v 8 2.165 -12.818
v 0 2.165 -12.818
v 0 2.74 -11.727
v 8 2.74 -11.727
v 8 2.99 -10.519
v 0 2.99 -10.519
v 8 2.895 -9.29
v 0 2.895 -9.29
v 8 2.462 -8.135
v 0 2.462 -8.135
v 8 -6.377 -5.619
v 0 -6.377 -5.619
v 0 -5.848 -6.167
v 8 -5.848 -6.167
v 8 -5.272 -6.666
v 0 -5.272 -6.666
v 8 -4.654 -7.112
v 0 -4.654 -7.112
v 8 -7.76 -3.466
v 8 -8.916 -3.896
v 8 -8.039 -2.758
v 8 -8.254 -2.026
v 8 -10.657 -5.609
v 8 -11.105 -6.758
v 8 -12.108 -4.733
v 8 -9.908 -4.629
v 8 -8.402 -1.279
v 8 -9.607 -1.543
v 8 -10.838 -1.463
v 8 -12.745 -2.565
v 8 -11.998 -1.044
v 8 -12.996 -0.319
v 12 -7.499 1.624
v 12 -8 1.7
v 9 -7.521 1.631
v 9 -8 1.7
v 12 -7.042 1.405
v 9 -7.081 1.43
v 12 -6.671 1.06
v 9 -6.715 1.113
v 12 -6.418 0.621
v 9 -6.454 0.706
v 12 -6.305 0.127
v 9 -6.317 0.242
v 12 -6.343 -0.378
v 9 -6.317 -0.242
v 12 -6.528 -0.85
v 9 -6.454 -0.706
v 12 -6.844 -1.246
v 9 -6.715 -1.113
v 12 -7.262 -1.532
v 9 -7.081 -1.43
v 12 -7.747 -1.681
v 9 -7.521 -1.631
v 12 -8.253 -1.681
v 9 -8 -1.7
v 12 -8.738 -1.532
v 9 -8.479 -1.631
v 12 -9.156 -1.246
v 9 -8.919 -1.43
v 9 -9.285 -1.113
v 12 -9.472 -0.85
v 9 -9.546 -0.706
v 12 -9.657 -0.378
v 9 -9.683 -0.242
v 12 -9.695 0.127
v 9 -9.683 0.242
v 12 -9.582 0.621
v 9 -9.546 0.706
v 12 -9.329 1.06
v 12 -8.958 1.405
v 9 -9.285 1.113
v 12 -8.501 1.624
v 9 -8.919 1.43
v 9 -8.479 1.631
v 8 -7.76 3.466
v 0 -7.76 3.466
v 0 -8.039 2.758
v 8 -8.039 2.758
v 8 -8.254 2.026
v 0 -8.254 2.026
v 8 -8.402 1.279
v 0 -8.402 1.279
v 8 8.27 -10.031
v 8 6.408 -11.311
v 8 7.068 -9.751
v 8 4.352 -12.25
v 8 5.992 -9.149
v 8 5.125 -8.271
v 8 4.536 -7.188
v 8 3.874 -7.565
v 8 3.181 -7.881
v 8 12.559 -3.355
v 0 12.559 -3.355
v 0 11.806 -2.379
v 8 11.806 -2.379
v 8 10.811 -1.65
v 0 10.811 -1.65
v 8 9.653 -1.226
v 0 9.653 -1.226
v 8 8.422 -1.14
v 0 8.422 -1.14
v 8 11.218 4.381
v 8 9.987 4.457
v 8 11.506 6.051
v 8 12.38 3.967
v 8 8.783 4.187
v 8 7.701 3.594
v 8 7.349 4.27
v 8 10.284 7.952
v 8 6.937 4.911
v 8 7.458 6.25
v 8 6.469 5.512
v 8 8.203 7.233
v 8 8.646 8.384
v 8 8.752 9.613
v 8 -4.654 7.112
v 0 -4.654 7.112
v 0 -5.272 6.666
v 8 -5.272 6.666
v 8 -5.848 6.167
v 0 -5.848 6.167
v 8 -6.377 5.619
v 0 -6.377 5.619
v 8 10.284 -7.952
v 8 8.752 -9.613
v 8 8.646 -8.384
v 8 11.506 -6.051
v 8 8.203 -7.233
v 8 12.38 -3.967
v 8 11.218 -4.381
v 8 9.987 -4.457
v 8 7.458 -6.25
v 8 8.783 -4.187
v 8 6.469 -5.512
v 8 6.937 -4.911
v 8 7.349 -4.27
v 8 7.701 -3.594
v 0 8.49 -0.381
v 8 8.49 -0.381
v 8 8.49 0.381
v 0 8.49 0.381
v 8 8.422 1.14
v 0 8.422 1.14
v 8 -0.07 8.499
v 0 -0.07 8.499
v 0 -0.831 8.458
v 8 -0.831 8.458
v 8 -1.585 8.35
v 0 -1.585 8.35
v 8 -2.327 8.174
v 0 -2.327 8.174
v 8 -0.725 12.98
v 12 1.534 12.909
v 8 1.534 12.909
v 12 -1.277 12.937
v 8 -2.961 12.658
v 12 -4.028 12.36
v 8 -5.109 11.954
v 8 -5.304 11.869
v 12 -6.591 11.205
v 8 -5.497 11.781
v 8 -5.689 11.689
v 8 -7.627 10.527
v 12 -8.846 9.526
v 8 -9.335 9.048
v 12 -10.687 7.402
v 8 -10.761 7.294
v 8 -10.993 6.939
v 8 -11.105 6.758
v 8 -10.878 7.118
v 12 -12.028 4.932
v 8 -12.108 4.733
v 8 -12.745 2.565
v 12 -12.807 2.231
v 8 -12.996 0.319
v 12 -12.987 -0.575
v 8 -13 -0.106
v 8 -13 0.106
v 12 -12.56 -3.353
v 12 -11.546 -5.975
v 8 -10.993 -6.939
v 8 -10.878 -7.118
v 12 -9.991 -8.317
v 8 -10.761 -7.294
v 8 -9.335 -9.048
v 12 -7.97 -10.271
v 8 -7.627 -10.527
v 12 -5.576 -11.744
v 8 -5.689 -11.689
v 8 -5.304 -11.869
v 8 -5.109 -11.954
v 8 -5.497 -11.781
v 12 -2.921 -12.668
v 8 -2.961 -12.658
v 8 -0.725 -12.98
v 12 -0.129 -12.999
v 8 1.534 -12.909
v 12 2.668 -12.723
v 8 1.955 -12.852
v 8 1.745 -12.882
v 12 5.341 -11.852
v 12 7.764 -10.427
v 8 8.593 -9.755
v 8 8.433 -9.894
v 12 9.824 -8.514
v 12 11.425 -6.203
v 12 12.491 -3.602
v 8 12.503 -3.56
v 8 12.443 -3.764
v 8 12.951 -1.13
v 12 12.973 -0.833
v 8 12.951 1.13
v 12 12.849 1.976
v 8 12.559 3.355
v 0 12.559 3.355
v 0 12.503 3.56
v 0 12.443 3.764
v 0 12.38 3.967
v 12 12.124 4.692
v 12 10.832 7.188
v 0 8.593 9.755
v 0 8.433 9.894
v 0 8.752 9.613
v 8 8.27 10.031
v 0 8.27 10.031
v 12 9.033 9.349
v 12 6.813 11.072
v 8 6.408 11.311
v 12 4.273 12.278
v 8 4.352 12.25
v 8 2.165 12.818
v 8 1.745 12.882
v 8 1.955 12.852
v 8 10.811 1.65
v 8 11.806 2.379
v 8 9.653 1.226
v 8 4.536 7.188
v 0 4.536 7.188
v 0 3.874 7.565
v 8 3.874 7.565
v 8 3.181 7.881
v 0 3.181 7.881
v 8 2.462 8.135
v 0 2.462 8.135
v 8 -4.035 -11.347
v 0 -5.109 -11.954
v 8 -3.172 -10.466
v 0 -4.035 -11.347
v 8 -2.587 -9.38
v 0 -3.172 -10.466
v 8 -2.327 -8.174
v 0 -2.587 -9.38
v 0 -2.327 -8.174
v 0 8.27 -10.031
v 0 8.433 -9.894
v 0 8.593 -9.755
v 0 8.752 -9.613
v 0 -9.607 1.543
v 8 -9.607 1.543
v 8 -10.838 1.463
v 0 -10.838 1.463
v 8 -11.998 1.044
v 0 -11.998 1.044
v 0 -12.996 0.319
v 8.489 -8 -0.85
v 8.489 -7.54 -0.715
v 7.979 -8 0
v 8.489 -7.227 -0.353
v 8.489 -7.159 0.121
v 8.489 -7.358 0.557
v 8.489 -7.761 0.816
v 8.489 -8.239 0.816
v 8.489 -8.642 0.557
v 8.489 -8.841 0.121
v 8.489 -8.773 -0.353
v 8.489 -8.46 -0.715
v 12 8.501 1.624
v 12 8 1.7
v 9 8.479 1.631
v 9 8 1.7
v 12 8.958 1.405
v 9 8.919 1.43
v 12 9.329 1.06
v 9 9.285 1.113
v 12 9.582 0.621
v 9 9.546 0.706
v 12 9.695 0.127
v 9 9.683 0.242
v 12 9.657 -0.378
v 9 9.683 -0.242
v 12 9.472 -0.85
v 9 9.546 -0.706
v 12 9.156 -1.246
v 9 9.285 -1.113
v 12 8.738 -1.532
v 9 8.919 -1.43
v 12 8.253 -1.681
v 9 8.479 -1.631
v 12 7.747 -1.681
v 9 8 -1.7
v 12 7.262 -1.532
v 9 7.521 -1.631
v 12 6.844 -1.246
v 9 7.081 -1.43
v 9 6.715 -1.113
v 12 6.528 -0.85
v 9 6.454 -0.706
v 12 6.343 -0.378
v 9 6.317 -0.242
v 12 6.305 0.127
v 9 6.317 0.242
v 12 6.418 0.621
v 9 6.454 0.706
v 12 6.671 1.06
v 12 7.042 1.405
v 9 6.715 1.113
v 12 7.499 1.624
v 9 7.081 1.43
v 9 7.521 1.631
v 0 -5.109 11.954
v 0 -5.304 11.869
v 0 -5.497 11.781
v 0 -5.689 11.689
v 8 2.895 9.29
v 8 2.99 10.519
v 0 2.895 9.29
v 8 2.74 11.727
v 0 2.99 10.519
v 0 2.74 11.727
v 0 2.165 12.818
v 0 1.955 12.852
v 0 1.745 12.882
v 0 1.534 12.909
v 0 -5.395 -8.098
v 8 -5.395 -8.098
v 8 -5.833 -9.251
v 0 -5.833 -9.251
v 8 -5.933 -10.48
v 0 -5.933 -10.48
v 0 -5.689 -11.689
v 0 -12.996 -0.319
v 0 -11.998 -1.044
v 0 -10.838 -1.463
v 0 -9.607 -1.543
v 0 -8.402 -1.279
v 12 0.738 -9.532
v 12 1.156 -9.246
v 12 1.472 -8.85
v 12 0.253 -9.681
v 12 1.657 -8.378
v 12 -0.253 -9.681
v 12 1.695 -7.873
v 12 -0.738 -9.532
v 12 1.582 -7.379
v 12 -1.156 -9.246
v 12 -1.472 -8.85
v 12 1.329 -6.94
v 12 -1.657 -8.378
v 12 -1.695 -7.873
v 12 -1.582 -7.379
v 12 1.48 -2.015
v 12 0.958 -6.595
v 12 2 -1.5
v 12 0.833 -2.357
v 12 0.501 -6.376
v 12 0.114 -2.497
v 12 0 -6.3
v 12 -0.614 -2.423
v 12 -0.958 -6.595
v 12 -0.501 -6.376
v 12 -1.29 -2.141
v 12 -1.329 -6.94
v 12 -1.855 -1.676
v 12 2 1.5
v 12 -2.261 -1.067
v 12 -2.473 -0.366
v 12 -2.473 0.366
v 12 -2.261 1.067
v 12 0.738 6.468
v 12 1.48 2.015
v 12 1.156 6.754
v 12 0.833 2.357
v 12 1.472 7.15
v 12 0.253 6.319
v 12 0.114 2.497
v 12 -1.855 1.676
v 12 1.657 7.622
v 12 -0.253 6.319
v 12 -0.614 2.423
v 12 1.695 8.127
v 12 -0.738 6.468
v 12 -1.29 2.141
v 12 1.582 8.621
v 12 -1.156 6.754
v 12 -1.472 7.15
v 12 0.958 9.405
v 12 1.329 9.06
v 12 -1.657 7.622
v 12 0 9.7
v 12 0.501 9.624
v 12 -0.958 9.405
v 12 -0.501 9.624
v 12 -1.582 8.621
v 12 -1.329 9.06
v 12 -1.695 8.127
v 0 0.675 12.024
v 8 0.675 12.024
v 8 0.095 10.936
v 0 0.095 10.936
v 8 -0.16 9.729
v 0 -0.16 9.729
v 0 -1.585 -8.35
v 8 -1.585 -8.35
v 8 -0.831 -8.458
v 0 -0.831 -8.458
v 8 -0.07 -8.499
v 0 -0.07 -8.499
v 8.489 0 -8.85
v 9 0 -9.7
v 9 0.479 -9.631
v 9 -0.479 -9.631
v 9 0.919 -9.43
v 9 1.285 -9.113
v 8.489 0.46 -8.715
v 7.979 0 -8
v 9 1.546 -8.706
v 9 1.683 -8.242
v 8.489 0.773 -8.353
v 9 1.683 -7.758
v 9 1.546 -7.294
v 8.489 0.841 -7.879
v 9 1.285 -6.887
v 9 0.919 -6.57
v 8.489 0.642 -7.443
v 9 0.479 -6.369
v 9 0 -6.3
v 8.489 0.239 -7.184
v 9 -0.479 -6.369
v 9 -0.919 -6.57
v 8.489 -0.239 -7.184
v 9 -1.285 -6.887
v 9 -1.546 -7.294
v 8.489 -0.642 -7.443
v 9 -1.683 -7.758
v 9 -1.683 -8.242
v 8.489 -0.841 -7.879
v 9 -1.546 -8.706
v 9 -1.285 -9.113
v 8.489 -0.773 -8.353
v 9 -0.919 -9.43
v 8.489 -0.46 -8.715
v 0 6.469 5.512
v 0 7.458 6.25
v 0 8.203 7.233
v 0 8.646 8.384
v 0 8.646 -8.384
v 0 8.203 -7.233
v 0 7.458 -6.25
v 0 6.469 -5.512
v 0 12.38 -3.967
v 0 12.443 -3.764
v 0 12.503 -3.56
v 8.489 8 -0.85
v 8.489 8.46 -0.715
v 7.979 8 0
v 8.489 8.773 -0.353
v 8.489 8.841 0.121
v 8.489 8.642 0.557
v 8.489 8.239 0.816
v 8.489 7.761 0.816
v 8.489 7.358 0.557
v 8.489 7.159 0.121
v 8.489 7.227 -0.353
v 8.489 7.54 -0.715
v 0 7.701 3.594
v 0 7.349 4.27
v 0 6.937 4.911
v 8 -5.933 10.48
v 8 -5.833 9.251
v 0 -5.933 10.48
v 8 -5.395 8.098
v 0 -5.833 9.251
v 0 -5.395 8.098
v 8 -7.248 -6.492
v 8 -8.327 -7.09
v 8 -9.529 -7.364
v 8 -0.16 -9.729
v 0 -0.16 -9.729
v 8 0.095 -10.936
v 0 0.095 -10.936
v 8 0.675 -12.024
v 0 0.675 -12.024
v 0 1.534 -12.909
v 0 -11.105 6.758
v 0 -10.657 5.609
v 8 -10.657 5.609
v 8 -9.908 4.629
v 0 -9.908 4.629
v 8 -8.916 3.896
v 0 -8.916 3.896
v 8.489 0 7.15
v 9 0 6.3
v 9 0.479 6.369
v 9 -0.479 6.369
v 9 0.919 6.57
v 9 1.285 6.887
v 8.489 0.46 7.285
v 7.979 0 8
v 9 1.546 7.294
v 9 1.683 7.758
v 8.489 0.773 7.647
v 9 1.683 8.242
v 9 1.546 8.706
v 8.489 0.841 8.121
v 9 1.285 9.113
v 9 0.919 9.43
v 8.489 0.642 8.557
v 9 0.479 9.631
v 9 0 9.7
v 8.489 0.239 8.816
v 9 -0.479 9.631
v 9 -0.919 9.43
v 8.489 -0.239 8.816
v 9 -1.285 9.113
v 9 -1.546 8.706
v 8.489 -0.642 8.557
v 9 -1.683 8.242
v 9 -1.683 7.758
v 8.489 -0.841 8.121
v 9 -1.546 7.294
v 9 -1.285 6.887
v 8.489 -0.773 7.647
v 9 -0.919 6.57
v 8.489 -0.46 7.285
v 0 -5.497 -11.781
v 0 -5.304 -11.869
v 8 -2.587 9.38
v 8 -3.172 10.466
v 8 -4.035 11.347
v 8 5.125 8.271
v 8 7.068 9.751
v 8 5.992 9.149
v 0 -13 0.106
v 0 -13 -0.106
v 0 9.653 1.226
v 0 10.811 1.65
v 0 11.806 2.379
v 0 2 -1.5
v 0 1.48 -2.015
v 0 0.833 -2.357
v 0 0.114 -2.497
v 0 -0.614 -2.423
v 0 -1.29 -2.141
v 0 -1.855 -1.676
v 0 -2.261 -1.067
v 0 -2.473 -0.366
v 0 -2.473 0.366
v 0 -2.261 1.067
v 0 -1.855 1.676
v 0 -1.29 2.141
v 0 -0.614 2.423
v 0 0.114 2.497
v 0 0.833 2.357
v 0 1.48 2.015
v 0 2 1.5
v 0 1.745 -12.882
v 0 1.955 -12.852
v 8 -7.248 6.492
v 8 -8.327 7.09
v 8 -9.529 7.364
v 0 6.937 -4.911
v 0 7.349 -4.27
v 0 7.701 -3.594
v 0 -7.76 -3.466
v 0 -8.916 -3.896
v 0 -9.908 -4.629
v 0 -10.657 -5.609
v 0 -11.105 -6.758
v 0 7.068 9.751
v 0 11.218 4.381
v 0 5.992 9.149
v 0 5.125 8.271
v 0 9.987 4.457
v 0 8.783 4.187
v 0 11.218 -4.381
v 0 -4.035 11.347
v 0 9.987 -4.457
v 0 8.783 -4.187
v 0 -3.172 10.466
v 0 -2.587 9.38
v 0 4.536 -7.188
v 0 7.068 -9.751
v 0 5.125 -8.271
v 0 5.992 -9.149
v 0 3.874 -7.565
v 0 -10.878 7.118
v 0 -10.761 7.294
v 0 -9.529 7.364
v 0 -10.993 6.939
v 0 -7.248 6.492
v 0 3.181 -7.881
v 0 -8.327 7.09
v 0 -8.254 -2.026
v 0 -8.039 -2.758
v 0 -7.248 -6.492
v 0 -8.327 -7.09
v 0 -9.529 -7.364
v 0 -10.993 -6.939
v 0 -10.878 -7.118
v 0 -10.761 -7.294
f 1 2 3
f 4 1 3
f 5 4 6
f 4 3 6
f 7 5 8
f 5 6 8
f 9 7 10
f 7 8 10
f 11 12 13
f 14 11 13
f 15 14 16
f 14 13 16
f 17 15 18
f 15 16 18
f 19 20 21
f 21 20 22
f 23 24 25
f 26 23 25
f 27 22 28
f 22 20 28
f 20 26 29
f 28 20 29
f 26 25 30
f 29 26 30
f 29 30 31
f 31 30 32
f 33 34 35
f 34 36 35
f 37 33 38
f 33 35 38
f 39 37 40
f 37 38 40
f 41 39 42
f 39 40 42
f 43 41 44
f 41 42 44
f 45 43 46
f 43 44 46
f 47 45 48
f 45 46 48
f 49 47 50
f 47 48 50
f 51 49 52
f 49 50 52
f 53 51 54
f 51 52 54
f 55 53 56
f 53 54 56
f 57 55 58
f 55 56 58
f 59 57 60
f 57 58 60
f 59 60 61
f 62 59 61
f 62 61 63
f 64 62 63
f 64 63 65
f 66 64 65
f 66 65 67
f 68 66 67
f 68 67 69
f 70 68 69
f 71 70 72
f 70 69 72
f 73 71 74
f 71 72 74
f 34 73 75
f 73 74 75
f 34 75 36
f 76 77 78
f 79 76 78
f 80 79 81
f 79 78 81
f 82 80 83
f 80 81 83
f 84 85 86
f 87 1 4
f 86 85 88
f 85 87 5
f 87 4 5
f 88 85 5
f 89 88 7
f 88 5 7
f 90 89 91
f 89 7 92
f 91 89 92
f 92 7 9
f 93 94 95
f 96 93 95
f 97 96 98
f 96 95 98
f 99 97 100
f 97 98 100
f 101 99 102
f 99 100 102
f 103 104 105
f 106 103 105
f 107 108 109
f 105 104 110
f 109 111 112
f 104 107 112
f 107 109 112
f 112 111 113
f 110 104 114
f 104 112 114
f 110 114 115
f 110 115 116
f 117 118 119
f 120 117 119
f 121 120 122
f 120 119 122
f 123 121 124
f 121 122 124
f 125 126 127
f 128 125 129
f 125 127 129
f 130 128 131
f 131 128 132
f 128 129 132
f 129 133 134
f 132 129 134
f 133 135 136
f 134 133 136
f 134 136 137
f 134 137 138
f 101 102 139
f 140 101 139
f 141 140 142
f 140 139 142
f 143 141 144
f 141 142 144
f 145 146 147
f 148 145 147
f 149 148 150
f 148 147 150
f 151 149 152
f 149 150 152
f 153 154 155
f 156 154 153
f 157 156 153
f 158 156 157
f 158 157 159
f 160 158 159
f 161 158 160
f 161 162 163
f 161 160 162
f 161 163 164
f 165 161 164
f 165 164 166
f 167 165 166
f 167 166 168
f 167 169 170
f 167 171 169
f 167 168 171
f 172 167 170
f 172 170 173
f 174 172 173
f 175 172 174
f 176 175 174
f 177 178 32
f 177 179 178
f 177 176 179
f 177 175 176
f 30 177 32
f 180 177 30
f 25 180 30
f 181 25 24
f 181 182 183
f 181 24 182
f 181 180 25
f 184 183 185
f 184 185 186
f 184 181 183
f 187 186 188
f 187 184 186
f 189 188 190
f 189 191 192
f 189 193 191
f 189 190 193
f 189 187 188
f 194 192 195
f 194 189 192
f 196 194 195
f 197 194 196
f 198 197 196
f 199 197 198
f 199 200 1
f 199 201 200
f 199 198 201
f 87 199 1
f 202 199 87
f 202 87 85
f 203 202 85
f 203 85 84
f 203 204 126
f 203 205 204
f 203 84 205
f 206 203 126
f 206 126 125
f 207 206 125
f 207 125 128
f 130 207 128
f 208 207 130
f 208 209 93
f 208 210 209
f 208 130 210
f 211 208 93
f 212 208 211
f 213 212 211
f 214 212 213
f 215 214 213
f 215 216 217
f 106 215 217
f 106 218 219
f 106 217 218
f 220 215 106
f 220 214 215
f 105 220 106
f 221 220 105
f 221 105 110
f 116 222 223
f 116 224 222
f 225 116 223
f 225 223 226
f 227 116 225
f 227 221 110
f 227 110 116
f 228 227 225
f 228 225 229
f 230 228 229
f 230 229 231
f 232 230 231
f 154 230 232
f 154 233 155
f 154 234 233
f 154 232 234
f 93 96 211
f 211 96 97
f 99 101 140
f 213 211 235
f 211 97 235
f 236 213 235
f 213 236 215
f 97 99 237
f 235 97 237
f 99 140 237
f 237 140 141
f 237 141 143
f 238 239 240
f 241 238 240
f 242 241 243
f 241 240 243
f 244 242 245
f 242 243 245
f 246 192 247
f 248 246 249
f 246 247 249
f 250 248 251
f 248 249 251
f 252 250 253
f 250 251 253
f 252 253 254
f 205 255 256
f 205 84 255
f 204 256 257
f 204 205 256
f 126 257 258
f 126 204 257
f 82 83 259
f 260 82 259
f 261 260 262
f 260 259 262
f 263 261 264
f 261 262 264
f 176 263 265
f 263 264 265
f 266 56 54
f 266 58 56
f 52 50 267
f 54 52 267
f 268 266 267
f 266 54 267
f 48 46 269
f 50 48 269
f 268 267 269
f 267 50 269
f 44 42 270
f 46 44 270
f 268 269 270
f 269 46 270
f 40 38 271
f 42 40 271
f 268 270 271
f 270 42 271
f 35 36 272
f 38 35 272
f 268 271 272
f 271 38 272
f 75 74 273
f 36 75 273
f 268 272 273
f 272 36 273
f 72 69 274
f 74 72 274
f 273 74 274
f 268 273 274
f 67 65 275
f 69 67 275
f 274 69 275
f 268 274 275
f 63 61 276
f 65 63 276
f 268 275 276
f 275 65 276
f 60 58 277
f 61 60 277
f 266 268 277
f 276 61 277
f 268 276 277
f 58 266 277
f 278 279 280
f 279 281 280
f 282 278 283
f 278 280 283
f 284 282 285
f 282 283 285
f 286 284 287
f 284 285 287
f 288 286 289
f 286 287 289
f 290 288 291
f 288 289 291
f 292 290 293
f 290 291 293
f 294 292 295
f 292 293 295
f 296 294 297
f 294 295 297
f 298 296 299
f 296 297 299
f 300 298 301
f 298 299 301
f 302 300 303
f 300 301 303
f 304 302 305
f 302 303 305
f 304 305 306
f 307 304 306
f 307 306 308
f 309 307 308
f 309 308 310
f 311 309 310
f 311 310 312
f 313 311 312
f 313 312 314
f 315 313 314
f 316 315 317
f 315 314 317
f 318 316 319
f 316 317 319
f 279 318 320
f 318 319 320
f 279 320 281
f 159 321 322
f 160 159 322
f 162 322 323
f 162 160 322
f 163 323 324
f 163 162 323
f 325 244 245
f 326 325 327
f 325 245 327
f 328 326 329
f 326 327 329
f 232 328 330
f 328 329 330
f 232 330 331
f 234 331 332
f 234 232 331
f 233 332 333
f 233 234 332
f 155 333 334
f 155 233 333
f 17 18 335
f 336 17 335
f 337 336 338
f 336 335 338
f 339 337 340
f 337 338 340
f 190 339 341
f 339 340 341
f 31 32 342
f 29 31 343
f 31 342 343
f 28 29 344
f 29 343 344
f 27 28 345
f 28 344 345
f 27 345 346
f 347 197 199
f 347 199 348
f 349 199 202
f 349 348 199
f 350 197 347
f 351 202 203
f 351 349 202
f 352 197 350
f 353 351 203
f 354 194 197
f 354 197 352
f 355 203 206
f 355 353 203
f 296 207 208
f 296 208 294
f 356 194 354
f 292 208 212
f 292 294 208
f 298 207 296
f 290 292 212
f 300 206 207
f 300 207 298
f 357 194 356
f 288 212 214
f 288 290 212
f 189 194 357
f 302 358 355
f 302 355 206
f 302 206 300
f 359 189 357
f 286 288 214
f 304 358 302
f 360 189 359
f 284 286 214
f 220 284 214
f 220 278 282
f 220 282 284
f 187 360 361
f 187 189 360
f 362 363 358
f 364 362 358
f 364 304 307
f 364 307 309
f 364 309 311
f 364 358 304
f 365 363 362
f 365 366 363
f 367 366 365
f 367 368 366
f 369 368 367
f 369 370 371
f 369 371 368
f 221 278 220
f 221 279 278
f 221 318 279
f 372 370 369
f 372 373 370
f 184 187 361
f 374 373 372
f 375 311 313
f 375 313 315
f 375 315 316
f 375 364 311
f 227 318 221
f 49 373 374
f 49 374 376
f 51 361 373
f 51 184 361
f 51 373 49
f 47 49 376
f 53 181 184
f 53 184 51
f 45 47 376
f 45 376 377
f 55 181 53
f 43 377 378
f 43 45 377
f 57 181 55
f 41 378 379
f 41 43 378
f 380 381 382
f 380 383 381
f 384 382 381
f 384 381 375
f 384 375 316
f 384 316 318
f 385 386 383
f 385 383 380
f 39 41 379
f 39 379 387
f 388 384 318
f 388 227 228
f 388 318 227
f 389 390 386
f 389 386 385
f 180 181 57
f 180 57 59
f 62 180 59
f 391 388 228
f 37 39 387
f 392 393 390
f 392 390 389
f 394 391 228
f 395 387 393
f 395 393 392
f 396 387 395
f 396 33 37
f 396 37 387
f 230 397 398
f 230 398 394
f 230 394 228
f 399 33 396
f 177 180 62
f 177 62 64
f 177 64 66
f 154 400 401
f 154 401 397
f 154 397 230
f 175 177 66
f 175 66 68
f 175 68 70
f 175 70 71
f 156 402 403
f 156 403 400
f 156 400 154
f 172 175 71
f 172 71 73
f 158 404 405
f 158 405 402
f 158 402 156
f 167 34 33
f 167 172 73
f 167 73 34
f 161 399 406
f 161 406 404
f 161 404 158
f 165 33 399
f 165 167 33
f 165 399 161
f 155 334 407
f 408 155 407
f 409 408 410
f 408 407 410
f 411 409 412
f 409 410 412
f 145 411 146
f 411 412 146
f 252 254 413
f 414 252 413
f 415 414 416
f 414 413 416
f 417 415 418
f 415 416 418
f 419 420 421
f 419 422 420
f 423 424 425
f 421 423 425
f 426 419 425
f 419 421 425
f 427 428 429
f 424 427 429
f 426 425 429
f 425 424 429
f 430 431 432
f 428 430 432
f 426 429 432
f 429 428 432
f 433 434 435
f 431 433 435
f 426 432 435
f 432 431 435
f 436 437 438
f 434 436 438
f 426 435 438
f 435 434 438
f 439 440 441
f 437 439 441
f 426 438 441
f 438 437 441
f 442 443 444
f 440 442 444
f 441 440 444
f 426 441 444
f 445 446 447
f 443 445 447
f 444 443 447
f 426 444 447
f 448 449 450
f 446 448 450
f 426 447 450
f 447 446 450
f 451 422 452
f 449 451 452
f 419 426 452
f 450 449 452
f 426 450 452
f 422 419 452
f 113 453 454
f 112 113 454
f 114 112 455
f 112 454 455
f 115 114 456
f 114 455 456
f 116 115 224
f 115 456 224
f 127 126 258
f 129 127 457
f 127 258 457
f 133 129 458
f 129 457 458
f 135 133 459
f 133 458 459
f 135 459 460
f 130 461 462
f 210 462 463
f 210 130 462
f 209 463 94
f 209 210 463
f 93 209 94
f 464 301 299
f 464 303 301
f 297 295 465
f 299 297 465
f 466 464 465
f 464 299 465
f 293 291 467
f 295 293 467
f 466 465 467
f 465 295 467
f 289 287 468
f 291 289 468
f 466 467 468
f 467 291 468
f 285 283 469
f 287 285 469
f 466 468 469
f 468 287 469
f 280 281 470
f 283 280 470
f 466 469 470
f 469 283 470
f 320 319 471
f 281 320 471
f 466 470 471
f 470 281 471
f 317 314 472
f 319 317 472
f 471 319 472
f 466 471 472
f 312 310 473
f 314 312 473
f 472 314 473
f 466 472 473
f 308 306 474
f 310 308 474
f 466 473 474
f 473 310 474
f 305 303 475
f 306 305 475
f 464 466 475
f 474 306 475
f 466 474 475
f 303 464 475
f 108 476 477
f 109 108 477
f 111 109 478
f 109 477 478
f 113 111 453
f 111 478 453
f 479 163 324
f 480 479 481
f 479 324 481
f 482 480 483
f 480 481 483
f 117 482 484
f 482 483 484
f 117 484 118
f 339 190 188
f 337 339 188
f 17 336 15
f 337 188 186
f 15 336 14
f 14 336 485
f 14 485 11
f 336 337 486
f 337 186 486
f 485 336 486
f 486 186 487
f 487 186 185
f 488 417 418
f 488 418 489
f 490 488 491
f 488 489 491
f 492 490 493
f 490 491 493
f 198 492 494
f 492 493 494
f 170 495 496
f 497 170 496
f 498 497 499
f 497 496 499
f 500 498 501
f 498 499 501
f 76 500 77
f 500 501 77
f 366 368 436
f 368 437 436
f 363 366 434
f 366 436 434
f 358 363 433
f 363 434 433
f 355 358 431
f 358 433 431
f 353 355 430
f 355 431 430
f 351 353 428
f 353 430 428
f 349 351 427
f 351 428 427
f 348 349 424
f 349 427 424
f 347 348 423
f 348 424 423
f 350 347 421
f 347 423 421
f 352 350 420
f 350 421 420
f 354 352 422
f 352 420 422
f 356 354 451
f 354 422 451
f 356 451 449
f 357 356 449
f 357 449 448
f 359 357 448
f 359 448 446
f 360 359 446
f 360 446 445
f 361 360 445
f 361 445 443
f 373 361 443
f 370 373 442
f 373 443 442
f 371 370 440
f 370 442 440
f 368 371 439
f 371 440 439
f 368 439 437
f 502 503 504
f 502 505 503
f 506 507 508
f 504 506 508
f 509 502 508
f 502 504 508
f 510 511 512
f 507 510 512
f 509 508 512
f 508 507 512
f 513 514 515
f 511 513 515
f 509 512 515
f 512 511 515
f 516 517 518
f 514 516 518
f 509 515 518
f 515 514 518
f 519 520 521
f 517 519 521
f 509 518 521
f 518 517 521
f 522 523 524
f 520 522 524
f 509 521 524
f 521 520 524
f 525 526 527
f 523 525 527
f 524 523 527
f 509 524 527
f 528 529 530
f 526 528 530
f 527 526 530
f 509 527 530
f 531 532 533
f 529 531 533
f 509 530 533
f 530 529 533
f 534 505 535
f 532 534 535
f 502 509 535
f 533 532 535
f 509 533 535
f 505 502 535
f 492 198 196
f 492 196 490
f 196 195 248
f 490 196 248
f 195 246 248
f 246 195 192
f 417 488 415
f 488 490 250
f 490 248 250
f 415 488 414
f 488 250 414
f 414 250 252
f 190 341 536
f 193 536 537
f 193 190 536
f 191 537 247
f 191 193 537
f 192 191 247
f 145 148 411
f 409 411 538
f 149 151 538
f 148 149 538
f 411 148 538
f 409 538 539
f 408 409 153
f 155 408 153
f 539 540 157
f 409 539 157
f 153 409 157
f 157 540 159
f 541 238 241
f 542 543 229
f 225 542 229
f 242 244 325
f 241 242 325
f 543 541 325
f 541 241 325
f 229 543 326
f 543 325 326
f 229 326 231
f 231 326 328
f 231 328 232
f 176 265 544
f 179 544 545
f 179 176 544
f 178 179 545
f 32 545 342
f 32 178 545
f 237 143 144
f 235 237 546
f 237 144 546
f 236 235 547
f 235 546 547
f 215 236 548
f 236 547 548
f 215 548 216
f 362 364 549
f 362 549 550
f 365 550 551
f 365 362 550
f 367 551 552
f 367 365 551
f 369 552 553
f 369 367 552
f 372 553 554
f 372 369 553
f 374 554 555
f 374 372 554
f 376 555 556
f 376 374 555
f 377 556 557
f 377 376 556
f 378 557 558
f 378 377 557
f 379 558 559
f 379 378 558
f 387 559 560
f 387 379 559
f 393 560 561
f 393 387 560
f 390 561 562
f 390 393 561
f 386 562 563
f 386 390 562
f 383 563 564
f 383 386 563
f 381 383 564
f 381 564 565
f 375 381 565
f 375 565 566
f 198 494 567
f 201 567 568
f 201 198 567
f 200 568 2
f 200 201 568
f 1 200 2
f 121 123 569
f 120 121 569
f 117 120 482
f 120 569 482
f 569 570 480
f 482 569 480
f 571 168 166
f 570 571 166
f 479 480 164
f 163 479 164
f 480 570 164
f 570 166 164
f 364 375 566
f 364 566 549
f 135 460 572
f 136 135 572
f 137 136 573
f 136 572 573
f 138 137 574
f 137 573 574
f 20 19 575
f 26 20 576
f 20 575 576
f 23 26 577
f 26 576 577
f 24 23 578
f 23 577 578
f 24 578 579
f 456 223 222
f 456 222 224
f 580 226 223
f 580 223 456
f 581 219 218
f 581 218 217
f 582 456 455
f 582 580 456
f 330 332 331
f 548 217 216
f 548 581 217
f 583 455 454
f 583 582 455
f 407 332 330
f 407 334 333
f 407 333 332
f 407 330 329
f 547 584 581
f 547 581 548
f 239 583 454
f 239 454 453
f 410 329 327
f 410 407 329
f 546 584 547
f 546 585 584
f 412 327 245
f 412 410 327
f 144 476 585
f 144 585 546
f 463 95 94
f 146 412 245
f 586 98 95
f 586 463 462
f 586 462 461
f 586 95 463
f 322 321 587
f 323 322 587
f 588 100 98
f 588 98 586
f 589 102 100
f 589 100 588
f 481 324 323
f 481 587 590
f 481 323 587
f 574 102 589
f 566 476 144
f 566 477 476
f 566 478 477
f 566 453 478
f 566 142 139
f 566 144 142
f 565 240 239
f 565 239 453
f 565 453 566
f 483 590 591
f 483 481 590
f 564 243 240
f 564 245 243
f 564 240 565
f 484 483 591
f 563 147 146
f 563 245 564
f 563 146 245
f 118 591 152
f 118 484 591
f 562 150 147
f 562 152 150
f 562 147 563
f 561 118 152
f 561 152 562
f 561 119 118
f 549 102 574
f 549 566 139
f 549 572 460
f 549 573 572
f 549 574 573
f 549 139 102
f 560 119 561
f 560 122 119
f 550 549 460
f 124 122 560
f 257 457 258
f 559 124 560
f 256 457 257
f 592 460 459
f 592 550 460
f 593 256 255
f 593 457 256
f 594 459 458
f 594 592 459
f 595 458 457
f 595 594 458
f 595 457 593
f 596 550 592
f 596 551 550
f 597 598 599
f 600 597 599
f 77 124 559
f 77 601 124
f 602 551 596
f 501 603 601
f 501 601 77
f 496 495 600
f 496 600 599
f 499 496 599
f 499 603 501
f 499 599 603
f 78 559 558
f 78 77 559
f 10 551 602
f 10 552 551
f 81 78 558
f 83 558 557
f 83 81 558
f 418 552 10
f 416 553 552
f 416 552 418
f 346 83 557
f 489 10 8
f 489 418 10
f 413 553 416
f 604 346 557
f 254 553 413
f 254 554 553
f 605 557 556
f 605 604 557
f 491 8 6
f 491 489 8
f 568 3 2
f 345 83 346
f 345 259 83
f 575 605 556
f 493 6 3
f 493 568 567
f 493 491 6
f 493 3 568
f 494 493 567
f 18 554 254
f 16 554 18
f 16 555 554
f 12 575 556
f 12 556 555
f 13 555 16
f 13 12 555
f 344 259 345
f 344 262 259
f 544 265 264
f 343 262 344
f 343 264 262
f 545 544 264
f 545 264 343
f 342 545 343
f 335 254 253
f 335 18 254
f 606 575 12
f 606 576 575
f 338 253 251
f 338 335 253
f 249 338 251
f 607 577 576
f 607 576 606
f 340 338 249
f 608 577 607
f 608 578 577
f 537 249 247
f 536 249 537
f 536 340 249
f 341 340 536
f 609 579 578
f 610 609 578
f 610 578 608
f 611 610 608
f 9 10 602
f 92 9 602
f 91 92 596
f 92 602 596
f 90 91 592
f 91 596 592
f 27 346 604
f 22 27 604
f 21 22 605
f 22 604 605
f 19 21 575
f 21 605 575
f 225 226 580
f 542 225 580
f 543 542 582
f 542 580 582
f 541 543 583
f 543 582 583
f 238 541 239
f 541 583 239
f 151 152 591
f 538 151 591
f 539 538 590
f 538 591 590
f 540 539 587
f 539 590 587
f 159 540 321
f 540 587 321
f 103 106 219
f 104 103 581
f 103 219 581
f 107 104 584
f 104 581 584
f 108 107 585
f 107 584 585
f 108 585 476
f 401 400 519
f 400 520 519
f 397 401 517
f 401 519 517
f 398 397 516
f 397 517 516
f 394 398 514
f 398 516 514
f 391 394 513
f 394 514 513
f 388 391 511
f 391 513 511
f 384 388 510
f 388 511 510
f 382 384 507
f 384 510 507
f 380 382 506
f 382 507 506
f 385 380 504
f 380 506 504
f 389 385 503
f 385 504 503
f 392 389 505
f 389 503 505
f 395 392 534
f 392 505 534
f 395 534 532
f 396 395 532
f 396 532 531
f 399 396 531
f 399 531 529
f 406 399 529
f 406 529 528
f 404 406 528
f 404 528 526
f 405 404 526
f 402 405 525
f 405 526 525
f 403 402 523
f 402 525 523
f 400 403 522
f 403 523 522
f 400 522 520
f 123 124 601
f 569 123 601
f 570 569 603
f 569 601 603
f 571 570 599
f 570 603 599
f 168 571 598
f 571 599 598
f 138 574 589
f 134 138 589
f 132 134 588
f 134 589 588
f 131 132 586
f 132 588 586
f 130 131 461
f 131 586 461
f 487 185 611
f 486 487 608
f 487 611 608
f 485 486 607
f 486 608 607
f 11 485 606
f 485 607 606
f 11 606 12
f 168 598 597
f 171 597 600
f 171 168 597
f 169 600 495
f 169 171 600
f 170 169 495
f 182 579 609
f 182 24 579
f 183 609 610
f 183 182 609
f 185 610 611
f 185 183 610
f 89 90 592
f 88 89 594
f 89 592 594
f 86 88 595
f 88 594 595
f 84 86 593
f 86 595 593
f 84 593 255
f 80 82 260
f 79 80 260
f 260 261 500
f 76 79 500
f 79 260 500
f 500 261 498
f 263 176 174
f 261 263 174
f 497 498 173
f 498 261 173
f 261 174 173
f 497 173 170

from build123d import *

# Parameters (mm, degrees)
BASPROSKE_W                  = 8
BASPROSKE_H                  = 13
TOOTHCUT_DEPTH               = 21.049937656
TEETHCUTS_COUNT              = 11
TEETHCUTS_ANGLE              = 327.272727273
BORSKE_R                     = 0.4
BORE_DEPTH                   = 50.0000508
ESTRUSIONE_ESTRUSIONE1_START = 4
SCHIZZO2_R                   = 13
ESTRUSIONE_ESTRUSIONE1_DEPTH = 4
TAGLIO_ESTRUSIONE1_DEPTH     = 14
FORO_PER_VITE_M3_1_D         = 3.4
FORO_PER_VITE_M3_1_DEPTH     = 3
FORO_PER_VITE_M3_1_TIP       = 1.021463052


with BuildPart() as part:
    # BasProSke → Base-Revolve (revolve)
    with BuildSketch(Plane(origin=(0, 0, 0), x_dir=(1, 0, 0), z_dir=(0, 1, 0)), mode=Mode.PRIVATE) as base_revolve_sk:
        with Locations((4, 6.5)):
            Rectangle(BASPROSKE_W, BASPROSKE_H)
    revolve(base_revolve_sk.sketch.rotate(Axis((-10, 0, 0), (1, 0, 0)), 180), axis=Axis((-10, 0, 0), (1, 0, 0)))

    # TooCutSke → ToothCut (cut, through all)
    with BuildSketch(Plane(origin=(0, 0, 0), x_dir=(0, 0, -1), z_dir=(1, 0, 0))):
        with BuildLine():
            ThreePointArc((1.139858048, 8.422216135), (0, 8.499), (-1.139858048, 8.422216135))
            ThreePointArc((-1.139858048, 8.422216135), (-1.658602184, 10.826907356), (-3.387115532, 12.577300725))
            ThreePointArc((-3.387115532, 12.577300725), (0, 13.0254), (3.387115532, 12.577300725))
            ThreePointArc((3.387115532, 12.577300725), (1.658602184, 10.826907356), (1.139858048, 8.422216135))
        make_face()
    toothcut = extrude(amount=TOOTHCUT_DEPTH, mode=Mode.SUBTRACT)

    # TeethCuts: ToothCut ×11 about axis
    teethcuts_axis = Axis((-10, 0, 0), (1, 0, 0))
    for i in range(1, TEETHCUTS_COUNT):
        add(toothcut.rotate(teethcuts_axis, i * TEETHCUTS_ANGLE / (TEETHCUTS_COUNT - 1)), mode=Mode.SUBTRACT)

    # BorSke → Bore (cut, symmetric)
    with BuildSketch(Plane(origin=(0, 0, 0), x_dir=(0, 0, -1), z_dir=(1, 0, 0))):
        with Locations(Location((0, 0, 0), (0, 0, 180))):
            Circle(BORSKE_R)
    extrude(amount=BORE_DEPTH, both=True, mode=Mode.SUBTRACT)

    # Schizzo2 → Estrusione-Estrusione1 (add)
    with BuildSketch(Plane(origin=(8, 0, 0), x_dir=(0, 0, -1), z_dir=(1, 0, 0)).offset(ESTRUSIONE_ESTRUSIONE1_START)):
        with Locations(Location((0, 0, 0), (0, 0, 173.223714884))):
            Circle(SCHIZZO2_R)
    extrude(amount=-ESTRUSIONE_ESTRUSIONE1_DEPTH)

    # Schizzo1 → Taglio-Estrusione1 (cut)
    with BuildSketch(Plane(origin=(12, 0, 0), x_dir=(0, 0, -1), z_dir=(1, 0, 0))):
        with BuildLine():
            Line((-1.5, 2), (1.5, 2))
            ThreePointArc((1.5, 2), (0, -2.5), (-1.5, 2))
        make_face()
    extrude(amount=-TAGLIO_ESTRUSIONE1_DEPTH, mode=Mode.SUBTRACT)

    # Foro per Vite M3-1
    with Locations(Plane(origin=(12, 0, 0), x_dir=(0, 0, -1), z_dir=(1, 0, 0))):
        with Locations((0, 8), (8, 0), (0, -8), (-8, 0)):
            Hole(FORO_PER_VITE_M3_1_D / 2, depth=FORO_PER_VITE_M3_1_DEPTH)
            with Locations((0, 0, -(FORO_PER_VITE_M3_1_DEPTH + FORO_PER_VITE_M3_1_TIP / 2))):  # 118° drill point
                Cone(0, FORO_PER_VITE_M3_1_D / 2, FORO_PER_VITE_M3_1_TIP, mode=Mode.SUBTRACT)


solid = part.part
